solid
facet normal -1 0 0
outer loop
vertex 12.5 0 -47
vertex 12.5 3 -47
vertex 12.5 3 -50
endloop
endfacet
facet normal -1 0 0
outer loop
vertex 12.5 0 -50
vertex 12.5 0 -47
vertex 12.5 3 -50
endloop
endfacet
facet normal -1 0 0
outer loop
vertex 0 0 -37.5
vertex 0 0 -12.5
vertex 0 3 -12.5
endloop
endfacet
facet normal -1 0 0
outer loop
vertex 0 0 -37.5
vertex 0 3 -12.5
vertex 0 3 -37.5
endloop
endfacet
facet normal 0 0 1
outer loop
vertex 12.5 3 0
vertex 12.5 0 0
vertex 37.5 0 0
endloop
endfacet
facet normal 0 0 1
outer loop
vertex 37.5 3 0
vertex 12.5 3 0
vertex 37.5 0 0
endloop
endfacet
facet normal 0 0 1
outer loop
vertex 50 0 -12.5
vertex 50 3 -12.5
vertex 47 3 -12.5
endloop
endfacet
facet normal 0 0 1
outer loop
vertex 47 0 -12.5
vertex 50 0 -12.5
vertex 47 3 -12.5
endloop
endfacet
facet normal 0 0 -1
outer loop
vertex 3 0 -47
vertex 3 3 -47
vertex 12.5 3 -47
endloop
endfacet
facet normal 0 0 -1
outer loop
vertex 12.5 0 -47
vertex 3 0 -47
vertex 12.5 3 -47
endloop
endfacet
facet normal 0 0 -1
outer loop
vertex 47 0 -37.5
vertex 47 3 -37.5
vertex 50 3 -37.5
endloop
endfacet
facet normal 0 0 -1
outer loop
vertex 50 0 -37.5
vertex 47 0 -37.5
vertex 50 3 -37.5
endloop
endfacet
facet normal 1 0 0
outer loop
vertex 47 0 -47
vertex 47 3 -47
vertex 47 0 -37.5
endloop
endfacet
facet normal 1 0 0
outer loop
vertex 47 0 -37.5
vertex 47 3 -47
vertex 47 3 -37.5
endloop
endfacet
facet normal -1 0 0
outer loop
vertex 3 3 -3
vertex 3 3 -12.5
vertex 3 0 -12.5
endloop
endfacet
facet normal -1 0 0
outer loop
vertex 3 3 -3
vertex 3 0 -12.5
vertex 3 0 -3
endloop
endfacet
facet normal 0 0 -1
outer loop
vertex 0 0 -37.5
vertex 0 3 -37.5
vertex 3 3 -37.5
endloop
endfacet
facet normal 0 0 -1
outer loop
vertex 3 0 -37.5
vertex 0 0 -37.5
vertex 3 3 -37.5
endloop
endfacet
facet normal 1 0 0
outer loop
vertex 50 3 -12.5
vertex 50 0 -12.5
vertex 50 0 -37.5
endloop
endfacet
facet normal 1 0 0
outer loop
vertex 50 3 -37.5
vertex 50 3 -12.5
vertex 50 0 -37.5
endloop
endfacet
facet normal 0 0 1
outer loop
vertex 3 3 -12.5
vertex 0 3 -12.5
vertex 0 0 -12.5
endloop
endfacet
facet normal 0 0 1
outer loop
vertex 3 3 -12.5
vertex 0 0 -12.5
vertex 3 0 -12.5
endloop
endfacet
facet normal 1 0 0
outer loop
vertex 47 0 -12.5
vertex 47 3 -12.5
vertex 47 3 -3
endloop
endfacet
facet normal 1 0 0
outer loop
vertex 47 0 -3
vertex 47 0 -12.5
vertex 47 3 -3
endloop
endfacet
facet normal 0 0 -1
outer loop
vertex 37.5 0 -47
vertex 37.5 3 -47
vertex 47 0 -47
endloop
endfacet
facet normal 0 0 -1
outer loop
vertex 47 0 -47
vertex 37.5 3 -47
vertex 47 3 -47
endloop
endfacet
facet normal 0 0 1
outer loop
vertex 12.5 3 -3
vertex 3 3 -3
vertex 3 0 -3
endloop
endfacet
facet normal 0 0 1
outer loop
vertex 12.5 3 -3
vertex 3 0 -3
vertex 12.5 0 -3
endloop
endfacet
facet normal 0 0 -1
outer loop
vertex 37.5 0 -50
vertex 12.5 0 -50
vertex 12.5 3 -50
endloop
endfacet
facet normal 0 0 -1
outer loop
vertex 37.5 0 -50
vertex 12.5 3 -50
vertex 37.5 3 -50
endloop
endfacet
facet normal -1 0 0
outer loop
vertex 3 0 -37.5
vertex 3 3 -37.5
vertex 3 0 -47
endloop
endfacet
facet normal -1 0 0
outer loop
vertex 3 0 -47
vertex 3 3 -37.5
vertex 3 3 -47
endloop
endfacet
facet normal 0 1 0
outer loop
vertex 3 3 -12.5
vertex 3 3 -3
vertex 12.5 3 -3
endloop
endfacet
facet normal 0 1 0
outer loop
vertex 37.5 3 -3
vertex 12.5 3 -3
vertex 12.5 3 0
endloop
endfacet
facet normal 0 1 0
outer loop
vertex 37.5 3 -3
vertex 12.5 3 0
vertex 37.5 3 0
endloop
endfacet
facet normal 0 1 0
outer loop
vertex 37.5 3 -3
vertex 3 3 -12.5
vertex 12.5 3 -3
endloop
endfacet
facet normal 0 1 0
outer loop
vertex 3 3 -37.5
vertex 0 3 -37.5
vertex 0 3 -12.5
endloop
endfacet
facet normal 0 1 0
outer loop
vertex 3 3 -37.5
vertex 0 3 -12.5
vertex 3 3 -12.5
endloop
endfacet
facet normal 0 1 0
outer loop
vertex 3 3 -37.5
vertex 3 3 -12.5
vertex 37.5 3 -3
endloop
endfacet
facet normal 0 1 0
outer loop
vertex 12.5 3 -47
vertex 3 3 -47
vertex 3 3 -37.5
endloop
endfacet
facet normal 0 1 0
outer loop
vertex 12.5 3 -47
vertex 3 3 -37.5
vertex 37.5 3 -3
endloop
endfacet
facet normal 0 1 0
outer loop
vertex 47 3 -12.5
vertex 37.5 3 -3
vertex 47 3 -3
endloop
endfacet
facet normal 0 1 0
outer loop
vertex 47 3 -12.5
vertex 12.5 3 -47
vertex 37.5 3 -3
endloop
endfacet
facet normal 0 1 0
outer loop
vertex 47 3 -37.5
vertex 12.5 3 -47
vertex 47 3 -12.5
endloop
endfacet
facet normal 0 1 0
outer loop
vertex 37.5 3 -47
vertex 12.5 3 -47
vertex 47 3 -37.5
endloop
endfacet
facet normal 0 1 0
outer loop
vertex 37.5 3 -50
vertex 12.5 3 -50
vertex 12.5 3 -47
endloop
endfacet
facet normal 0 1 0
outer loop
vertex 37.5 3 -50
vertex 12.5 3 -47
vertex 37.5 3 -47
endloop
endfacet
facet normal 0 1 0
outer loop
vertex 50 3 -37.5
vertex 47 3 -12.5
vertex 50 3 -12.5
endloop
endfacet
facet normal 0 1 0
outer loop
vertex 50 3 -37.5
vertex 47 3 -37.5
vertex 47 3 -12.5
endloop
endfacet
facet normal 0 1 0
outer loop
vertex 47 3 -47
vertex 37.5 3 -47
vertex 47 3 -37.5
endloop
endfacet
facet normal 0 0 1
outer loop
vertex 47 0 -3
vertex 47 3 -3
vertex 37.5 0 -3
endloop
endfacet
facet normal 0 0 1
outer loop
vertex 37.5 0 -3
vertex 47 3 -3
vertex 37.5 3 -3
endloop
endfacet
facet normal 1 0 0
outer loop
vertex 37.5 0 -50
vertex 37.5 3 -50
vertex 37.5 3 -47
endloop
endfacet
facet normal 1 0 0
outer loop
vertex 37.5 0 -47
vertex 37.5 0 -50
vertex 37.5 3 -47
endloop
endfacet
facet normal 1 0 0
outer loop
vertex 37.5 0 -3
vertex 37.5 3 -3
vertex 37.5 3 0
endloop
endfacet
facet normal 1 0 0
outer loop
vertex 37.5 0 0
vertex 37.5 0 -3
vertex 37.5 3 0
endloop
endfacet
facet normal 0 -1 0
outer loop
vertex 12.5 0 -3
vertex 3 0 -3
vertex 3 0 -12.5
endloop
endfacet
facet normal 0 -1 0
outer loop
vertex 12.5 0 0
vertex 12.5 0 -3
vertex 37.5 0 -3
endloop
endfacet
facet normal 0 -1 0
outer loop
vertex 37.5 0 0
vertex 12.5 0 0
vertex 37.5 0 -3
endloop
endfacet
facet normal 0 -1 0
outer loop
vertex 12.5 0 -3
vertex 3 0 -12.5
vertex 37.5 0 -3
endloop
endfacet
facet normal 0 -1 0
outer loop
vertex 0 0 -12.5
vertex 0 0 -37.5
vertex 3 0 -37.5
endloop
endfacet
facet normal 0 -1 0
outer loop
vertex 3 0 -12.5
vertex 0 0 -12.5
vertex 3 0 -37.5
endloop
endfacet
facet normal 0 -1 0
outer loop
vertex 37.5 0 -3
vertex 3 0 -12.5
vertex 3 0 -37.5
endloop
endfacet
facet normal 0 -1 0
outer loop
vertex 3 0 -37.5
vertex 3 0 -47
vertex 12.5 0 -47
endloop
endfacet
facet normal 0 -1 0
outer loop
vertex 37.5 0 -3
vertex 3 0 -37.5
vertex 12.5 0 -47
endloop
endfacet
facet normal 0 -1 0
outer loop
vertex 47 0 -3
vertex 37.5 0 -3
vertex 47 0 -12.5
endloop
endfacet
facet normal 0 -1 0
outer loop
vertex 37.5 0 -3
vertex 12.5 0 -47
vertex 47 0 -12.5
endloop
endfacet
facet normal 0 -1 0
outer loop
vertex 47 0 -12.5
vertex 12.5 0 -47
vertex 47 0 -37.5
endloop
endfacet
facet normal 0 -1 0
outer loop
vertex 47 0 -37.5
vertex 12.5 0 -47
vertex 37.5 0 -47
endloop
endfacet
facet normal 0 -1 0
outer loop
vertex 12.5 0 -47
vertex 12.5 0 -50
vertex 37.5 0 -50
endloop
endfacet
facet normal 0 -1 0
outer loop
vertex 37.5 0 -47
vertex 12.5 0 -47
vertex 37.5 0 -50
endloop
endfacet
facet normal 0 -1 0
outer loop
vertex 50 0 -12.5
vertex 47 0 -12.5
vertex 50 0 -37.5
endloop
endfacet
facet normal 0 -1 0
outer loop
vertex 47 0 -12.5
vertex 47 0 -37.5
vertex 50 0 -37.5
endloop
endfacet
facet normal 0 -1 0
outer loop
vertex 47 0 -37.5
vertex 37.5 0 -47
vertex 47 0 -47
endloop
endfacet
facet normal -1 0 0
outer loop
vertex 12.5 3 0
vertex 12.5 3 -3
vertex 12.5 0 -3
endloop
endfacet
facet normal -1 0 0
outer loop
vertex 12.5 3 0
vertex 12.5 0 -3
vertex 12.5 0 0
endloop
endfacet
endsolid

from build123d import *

# Parameters (mm, degrees)
ESQUISSE1_W             = 50
ESQUISSE1_H             = 50
BOSS_EXTRU_1_DEPTH      = 3
ENL_V_MAT_EXTRU_1_DEPTH = 3


with BuildPart() as part:
    # Esquisse1 → Boss.-Extru.1 (new body)
    with BuildSketch(Plane(origin=(0, 0, 0), x_dir=(1, 0, 0), z_dir=(0, 1, 0))):
        with Locations((25, 25)):
            Rectangle(ESQUISSE1_W, ESQUISSE1_H)
    extrude(amount=BOSS_EXTRU_1_DEPTH)

    # Esquisse2 → Enlèv. mat.-Extru.1 (cut)
    with BuildSketch(Plane(origin=(0, 3, 0), x_dir=(1, 0, 0), z_dir=(0, 1, 0))):
        Polygon((0, 37.5), (3, 37.5), (3, 47), (12.5, 47), (12.5, 50), (0, 50), align=None)
        Polygon((0, 12.5), (3, 12.5), (3, 3), (12.5, 3), (12.5, 0), (0, 0), align=None)
        Polygon((50, 12.5), (47, 12.5), (47, 3), (37.5, 3), (37.5, 0), (50, 0), align=None)
        Polygon((37.5, 50), (37.5, 47), (47, 47), (47, 37.5), (50, 37.5), (50, 50), align=None)
    extrude(amount=-ENL_V_MAT_EXTRU_1_DEPTH, mode=Mode.SUBTRACT)


solid = part.part
